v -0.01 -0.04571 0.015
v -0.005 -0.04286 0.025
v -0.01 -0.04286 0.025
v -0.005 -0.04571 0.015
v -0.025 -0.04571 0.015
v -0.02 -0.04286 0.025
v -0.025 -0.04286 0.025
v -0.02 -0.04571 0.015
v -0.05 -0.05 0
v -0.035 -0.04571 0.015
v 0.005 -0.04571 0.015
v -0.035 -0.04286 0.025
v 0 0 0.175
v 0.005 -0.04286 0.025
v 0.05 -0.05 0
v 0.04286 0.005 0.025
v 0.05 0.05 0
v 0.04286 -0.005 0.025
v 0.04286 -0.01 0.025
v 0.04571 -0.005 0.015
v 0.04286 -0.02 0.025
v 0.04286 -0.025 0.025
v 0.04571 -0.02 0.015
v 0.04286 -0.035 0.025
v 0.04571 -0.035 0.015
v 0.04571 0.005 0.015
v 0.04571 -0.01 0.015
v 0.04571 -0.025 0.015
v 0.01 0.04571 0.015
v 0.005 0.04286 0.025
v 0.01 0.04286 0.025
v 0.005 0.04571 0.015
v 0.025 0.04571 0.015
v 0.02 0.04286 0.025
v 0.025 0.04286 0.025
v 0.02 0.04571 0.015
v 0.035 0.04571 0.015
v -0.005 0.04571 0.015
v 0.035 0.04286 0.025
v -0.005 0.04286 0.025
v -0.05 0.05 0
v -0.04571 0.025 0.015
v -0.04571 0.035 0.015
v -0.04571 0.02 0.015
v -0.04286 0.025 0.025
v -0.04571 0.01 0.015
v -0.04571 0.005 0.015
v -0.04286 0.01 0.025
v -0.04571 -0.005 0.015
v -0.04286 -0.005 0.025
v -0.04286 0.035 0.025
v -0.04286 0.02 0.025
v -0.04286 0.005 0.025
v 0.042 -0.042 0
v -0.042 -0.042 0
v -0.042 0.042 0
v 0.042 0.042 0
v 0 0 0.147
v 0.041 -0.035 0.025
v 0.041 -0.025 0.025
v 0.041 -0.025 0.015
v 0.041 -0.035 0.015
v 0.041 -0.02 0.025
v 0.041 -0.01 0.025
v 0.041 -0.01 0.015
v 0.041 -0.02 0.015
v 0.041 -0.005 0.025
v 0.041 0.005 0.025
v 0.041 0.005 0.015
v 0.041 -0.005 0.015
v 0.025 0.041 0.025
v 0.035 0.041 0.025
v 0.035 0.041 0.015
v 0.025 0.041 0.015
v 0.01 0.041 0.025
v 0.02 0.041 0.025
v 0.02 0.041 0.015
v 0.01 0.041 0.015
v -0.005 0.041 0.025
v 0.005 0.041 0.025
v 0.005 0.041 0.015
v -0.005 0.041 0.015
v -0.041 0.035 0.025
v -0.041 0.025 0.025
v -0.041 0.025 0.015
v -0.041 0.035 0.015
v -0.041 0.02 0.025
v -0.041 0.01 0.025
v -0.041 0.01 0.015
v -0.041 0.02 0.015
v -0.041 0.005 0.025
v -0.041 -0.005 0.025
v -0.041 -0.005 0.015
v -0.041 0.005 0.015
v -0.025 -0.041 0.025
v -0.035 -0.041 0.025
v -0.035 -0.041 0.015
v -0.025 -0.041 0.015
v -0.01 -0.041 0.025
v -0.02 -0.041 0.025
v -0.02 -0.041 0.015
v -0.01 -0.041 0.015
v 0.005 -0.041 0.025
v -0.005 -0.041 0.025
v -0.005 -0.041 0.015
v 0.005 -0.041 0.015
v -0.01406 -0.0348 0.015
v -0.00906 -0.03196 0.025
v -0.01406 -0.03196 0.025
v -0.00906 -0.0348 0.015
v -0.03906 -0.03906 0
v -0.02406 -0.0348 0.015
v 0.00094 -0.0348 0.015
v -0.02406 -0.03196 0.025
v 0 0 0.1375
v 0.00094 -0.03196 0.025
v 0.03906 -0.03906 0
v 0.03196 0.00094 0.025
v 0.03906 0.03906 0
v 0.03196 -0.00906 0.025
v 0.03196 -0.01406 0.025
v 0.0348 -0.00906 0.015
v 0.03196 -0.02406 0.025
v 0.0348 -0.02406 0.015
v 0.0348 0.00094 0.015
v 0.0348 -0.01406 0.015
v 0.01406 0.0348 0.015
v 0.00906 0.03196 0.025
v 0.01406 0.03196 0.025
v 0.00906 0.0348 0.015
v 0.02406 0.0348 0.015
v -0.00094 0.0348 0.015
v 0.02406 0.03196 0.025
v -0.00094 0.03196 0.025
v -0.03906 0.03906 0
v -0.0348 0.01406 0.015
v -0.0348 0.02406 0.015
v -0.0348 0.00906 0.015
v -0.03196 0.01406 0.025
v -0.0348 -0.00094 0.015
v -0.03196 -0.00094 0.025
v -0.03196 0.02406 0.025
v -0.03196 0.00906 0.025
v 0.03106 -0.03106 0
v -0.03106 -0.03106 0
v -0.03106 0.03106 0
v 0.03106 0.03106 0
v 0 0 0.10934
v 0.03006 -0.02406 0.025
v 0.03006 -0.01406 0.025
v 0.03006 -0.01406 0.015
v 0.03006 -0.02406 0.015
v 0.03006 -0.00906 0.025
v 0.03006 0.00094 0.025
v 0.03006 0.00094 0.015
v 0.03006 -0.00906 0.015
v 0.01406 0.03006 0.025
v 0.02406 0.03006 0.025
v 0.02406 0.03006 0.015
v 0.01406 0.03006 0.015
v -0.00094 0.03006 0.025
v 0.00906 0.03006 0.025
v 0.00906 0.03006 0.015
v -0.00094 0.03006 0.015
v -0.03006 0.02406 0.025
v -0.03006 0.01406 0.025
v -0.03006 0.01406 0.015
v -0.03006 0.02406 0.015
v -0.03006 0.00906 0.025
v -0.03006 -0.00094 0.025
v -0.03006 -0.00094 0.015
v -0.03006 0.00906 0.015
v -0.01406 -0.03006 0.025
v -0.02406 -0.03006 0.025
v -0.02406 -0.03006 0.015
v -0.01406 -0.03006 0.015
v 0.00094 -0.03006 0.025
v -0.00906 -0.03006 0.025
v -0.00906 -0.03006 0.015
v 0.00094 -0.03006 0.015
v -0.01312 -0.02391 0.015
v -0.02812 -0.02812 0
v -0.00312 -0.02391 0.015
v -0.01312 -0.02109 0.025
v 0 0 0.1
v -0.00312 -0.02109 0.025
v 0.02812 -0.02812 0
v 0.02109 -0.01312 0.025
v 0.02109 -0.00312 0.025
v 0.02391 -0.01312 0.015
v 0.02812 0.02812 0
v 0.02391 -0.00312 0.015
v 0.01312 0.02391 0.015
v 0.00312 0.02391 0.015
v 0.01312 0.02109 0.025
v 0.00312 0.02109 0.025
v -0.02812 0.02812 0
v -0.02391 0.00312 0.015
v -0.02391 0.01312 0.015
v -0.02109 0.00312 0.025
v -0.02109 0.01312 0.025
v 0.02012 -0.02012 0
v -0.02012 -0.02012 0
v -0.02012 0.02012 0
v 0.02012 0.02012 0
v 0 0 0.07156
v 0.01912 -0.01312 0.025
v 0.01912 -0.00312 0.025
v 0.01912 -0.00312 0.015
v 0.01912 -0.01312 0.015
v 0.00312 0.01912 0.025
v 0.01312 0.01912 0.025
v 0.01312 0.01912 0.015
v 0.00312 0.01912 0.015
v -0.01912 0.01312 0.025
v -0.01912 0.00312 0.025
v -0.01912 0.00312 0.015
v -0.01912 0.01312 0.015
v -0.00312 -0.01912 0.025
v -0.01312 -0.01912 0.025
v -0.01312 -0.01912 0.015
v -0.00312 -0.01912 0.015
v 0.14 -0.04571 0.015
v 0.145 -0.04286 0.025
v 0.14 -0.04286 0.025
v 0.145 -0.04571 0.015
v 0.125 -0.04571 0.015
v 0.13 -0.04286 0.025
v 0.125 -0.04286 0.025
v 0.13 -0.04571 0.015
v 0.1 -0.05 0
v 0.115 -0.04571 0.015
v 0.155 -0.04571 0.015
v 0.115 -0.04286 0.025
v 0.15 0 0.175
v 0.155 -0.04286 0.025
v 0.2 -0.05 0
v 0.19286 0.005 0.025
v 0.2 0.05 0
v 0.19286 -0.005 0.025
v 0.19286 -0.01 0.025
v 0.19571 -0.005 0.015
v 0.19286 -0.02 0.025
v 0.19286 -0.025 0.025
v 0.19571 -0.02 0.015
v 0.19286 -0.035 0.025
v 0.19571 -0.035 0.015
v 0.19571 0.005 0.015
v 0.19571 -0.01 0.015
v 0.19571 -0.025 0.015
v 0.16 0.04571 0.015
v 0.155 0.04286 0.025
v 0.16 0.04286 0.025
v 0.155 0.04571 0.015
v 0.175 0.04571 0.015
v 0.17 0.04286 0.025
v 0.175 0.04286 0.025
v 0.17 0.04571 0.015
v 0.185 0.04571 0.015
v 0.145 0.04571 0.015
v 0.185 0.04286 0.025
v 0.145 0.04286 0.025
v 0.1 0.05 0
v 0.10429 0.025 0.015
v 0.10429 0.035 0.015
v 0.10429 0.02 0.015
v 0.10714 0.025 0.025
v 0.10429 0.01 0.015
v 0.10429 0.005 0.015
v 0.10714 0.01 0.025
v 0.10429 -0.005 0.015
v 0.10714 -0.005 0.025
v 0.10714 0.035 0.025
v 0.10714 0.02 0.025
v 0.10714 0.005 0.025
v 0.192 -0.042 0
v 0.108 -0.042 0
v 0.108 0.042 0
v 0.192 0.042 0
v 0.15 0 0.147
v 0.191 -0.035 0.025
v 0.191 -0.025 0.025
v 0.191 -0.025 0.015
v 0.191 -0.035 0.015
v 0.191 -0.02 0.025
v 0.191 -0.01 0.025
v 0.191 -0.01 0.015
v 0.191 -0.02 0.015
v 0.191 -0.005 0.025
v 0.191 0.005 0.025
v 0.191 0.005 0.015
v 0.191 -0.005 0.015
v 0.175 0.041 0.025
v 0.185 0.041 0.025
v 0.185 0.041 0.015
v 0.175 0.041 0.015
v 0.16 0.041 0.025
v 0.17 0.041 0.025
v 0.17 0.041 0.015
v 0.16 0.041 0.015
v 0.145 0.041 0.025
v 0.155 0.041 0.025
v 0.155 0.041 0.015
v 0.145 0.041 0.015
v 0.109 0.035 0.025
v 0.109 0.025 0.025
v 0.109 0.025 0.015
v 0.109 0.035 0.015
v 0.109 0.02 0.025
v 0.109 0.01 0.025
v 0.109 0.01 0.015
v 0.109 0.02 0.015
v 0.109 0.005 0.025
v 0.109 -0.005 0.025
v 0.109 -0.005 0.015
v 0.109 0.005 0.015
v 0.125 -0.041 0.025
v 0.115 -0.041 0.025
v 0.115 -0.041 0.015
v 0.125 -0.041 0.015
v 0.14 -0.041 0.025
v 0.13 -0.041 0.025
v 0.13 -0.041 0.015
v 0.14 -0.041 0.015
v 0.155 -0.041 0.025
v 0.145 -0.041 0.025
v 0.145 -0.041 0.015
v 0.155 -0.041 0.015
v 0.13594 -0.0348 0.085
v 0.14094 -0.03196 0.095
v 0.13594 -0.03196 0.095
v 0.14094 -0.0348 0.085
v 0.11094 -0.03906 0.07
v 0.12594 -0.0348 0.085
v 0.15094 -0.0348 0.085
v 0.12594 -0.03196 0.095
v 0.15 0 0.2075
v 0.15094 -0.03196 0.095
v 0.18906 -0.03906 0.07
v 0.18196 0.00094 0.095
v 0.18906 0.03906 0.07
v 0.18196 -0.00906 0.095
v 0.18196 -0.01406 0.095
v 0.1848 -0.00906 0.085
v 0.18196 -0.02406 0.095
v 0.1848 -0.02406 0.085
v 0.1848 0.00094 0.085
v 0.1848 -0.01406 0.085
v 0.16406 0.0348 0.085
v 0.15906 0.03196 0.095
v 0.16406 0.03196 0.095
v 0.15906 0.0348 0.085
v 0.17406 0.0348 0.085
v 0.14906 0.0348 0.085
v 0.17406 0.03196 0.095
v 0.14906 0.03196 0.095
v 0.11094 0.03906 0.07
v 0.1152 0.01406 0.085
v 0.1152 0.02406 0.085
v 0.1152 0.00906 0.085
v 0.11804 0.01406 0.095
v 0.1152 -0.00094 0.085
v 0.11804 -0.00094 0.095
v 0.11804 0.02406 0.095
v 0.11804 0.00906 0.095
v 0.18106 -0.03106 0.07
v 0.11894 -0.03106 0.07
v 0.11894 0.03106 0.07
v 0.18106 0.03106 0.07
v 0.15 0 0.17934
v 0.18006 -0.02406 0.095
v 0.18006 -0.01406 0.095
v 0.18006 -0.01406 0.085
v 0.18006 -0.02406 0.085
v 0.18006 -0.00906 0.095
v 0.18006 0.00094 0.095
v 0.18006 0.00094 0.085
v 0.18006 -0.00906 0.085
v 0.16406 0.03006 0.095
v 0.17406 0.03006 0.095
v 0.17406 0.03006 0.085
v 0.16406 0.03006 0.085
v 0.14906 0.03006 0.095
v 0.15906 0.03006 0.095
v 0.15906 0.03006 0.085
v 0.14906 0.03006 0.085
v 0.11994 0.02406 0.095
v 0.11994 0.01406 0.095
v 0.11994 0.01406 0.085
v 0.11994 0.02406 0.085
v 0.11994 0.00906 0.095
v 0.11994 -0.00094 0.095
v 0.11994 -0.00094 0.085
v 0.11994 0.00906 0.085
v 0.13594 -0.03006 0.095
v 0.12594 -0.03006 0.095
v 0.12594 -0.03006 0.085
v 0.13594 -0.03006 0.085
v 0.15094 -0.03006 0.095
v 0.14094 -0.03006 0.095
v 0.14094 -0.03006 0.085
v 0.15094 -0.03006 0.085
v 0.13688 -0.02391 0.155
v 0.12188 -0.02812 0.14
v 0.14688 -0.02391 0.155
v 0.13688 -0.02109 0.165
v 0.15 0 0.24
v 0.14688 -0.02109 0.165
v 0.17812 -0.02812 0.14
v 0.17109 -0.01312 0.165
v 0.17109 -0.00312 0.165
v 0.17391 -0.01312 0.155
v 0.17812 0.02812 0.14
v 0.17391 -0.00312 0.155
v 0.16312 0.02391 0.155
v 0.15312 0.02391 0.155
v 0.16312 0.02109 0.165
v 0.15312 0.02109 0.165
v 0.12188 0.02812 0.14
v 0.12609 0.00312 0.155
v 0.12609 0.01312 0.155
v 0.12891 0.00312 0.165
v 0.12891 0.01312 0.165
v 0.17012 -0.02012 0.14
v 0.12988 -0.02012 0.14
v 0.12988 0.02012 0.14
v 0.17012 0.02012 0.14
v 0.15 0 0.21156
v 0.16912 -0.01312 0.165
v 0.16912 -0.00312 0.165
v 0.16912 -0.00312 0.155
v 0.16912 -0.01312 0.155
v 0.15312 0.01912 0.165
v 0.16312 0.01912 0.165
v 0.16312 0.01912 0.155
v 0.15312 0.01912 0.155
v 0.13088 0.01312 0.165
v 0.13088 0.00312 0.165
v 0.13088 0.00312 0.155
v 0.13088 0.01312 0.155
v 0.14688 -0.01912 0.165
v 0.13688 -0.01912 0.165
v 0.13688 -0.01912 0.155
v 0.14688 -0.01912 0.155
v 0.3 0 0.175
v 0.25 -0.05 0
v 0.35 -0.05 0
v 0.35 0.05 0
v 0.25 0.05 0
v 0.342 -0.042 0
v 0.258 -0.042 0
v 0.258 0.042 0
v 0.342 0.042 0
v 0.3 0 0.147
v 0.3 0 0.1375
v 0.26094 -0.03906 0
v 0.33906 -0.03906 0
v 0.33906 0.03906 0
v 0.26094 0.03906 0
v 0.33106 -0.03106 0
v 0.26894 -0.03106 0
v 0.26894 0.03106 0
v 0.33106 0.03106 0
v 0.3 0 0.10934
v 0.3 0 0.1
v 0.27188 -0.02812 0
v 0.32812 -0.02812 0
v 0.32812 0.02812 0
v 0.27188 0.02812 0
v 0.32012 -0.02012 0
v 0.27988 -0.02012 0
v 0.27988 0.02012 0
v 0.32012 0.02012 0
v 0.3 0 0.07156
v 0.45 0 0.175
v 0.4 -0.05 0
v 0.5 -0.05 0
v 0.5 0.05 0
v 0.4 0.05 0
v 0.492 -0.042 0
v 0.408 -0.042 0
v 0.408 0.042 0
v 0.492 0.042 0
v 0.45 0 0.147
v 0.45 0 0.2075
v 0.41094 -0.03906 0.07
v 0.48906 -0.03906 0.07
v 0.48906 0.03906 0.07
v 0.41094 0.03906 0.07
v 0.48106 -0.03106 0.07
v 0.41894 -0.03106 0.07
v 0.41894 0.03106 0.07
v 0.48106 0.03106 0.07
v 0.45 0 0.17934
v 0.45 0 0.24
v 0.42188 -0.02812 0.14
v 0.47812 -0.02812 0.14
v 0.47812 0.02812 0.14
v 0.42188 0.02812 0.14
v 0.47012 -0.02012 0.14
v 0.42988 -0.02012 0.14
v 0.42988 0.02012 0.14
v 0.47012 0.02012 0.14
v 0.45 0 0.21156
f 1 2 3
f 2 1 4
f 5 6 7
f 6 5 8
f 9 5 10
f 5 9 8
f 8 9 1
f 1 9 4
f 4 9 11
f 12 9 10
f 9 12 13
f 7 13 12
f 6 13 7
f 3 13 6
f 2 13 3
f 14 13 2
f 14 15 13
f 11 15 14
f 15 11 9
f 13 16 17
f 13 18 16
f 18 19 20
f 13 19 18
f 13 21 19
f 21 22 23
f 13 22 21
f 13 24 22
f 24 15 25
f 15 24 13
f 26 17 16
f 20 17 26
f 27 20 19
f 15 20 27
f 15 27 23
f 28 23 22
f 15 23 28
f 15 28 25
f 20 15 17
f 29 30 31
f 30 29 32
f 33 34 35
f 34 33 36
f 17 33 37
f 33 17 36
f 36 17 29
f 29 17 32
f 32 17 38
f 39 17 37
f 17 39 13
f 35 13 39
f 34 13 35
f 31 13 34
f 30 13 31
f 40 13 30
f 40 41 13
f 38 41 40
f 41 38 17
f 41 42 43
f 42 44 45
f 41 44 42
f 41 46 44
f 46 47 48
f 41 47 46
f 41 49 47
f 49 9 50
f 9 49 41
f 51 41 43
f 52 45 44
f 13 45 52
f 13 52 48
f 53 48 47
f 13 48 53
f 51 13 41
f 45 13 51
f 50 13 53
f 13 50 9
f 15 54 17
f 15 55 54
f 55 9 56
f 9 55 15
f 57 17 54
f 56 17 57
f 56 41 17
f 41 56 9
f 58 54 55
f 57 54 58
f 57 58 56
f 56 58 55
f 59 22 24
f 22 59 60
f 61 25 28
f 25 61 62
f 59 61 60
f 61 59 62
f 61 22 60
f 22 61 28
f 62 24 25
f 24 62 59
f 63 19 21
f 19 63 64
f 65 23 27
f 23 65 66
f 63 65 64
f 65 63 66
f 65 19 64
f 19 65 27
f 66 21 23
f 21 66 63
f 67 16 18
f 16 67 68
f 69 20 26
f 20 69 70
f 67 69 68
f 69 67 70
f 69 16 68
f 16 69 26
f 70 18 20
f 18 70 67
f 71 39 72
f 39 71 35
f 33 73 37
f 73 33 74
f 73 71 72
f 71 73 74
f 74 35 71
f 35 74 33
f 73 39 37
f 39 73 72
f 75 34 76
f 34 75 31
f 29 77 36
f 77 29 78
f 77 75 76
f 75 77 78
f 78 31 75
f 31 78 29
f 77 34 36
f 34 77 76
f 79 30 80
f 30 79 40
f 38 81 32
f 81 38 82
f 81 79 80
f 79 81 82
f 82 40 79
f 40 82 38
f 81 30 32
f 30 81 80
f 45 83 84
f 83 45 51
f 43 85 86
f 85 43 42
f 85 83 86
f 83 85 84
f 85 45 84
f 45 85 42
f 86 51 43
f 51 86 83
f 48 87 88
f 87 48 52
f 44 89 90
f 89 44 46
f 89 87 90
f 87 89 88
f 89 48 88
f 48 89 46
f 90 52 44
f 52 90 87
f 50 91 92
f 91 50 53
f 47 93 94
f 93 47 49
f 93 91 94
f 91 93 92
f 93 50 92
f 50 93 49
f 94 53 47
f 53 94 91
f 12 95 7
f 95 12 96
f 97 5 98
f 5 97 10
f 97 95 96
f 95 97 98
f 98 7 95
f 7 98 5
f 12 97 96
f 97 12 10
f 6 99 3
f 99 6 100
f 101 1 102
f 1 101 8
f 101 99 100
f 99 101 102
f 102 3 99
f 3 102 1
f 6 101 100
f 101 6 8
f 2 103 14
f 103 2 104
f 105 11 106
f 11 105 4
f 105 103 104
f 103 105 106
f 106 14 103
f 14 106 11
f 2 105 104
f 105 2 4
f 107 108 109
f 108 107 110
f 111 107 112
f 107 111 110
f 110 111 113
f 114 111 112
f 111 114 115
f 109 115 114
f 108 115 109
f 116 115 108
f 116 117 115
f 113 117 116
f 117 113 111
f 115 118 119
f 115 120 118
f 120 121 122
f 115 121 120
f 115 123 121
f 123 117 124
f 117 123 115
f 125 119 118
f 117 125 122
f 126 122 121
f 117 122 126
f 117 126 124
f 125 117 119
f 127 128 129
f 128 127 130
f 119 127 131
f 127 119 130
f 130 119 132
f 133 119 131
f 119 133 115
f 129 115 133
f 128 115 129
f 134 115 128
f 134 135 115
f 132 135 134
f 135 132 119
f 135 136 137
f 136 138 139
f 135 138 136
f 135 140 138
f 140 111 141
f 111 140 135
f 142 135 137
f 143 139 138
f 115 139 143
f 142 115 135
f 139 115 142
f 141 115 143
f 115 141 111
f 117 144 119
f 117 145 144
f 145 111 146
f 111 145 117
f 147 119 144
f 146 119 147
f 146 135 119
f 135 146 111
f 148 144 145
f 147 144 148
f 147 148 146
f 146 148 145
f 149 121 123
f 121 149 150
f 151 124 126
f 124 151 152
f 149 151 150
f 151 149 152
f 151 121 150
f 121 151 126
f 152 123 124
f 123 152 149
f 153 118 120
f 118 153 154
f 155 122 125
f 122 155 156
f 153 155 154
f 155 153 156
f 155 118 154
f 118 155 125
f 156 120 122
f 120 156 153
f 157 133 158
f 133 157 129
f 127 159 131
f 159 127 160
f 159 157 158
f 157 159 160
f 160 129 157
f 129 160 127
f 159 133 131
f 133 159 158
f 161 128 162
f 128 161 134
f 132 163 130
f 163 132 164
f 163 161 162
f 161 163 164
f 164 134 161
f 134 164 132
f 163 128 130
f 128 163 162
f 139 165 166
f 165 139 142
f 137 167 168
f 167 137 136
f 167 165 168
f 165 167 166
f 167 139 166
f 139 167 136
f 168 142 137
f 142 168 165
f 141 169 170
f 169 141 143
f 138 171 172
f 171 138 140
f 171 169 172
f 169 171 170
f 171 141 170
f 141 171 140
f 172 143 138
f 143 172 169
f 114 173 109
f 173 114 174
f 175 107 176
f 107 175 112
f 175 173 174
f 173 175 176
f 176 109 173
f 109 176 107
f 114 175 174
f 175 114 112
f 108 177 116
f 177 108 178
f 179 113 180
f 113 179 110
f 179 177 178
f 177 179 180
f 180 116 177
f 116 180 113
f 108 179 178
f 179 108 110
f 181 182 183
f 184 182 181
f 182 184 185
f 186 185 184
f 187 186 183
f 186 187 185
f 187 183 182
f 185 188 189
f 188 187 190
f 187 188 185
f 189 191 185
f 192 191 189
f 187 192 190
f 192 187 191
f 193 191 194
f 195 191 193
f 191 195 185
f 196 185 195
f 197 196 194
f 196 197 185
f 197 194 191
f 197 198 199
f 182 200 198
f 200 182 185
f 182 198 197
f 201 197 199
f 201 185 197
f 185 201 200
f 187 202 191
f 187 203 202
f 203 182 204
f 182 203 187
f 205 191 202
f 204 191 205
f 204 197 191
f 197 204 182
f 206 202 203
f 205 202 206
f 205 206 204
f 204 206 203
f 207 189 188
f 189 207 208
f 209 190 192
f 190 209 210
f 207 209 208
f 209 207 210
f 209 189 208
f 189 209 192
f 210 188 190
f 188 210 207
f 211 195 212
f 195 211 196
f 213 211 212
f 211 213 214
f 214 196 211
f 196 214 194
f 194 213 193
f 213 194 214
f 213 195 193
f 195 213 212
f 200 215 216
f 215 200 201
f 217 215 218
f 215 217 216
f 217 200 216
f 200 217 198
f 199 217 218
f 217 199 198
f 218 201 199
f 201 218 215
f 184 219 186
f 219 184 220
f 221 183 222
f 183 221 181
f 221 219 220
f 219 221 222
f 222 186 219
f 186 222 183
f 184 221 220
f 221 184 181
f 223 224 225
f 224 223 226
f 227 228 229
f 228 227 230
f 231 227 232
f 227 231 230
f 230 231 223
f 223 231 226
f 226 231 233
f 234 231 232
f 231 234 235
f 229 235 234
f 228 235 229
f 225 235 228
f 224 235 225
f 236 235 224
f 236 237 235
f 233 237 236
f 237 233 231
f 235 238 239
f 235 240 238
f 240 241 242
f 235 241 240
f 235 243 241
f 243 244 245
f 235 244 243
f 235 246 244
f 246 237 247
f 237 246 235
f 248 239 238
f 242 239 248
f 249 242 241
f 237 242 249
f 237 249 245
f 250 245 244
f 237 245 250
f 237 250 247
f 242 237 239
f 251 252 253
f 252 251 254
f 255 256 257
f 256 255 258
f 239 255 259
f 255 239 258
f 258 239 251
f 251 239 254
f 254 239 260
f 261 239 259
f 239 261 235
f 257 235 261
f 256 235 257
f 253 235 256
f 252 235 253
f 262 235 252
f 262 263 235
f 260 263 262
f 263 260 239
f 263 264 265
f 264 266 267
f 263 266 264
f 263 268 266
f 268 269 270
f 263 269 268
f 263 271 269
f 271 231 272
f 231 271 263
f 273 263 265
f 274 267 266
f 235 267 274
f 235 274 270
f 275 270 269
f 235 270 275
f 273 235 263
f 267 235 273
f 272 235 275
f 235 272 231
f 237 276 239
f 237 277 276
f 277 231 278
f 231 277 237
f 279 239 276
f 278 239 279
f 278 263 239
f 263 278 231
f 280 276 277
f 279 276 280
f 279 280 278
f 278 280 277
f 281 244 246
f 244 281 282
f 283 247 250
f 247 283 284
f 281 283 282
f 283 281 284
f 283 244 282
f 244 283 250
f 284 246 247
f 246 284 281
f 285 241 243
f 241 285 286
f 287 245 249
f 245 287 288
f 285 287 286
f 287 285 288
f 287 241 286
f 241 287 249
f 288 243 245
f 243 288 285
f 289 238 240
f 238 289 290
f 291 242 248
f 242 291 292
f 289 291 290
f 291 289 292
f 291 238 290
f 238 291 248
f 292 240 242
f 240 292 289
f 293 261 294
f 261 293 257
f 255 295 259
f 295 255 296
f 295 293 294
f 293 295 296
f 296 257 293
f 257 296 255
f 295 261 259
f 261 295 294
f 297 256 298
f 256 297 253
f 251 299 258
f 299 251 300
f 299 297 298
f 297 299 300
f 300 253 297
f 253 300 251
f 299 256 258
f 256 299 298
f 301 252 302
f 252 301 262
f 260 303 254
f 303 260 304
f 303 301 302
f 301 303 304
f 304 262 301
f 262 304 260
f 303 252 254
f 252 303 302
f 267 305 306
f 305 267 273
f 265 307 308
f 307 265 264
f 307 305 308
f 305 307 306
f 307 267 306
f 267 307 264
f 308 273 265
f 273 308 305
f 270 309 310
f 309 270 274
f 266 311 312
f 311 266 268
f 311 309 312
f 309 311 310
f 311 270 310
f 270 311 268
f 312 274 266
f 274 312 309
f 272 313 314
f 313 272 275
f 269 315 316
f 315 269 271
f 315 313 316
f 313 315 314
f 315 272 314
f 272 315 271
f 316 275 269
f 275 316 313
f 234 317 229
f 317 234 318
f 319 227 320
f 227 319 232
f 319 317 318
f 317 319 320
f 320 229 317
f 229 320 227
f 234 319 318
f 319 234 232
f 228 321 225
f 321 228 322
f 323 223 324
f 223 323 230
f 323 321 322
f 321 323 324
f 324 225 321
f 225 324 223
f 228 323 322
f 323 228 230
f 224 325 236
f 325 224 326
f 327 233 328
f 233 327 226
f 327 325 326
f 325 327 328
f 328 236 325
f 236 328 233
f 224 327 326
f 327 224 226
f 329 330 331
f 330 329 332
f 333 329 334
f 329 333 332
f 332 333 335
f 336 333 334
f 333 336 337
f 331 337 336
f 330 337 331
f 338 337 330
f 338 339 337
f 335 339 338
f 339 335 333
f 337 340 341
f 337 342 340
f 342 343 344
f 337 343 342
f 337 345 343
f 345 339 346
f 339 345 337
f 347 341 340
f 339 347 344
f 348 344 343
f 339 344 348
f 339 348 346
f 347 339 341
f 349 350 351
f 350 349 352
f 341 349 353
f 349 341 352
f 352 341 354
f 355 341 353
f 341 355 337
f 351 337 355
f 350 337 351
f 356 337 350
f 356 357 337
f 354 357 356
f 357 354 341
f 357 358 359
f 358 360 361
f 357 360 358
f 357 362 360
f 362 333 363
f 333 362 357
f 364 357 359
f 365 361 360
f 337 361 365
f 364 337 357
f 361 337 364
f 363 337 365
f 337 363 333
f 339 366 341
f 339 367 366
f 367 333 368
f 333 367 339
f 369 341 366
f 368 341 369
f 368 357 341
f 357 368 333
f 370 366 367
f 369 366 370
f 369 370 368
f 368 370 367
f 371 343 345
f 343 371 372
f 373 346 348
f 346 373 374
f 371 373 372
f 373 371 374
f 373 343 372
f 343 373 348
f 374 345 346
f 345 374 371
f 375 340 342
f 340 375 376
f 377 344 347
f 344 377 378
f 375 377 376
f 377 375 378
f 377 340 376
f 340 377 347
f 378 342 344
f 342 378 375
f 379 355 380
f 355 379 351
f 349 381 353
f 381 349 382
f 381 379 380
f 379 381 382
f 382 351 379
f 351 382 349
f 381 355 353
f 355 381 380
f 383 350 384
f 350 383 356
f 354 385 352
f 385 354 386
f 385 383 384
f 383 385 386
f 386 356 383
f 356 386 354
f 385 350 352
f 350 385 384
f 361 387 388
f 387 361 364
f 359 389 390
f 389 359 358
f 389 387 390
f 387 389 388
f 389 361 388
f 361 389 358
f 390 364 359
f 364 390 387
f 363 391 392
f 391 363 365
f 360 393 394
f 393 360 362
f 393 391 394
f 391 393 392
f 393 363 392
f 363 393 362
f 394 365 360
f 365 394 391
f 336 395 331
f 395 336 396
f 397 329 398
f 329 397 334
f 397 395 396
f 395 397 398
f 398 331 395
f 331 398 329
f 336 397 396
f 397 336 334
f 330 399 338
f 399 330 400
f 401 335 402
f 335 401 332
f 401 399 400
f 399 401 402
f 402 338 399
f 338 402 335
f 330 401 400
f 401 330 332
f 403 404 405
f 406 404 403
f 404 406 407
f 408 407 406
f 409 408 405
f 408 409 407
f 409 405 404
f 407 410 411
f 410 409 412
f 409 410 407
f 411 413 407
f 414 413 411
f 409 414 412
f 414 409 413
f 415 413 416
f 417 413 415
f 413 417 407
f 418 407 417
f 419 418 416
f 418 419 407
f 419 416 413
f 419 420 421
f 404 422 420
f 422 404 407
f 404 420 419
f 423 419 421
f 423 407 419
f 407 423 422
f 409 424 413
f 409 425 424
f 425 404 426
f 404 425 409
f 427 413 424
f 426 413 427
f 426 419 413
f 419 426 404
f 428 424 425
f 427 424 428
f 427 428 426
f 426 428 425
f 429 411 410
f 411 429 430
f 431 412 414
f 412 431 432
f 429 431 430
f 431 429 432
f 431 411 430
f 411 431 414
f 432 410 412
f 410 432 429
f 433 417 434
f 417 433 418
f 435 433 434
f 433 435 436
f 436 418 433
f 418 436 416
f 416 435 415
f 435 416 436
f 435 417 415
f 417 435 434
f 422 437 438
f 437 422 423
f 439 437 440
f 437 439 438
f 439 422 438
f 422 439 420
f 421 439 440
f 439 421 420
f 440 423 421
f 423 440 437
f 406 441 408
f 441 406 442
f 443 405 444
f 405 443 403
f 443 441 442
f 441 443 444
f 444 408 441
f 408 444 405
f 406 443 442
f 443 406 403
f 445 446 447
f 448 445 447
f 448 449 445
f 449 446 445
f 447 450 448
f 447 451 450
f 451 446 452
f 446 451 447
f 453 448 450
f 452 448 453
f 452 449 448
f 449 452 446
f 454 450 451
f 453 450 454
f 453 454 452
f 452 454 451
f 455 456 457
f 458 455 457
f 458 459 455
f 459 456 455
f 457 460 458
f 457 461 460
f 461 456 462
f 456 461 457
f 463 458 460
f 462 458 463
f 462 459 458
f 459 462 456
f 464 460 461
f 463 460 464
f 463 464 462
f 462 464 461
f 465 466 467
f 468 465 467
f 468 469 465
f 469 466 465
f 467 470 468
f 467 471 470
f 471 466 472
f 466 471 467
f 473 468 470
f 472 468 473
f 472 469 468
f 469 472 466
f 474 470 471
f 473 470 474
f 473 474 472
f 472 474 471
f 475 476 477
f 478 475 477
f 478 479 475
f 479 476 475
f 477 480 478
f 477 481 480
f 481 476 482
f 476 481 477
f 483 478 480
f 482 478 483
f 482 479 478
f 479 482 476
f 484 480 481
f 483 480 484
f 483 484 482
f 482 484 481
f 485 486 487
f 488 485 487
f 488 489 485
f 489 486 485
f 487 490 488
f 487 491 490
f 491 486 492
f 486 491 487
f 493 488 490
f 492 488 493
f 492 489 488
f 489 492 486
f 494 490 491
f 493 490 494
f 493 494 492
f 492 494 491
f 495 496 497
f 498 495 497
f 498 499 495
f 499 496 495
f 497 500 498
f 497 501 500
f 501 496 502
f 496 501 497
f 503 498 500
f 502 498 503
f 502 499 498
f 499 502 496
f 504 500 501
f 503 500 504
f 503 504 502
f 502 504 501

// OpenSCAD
// Icehouse pieces
// https://en.wikipedia.org/wiki/Icehouse_pieces
//
// Dimensions:
// Large: Base 1, Height 7/4
// Medium: Base 25/32, Height 11/8
// Small: Base 9/16, Height 1
//
// Pyramids have a hollow center with a wall thickness of 0.08. They have small
// indentations on each face called pips to represent the size of the pyramid;
// large pyramids have three pips, medium pyramids have two pips, and small
// pyramids have one pip.

// What model to render
Model = "Demo"; // [Demo, L, M, S, L_C, M_C, S_C]

module pyramid(width, height) {
    x = -width / 2;
    y = -width / 2;
    polyhedron(
        [[x, y, 0], [x + width, y, 0], [x + width, y + width, 0],
         [x, y + width, 0], [x + width / 2, y + width / 2, height]],
        [ [ 0, 1, 4 ], [ 1, 2, 4 ], [ 2, 3, 4 ], [ 3, 0, 4 ], [ 3, 2, 1, 0 ] ]);
}

thickness = 0.008;

module hollow_pyramid(width, height) {
    width = width / 10;
    height = height / 10;
    difference() {
        pyramid(width, height);
        pyramid(width - thickness * 2,
                height / width * 2 * (width / 2 - thickness));
    }
}

module repeat_4() {
    children();
    rotate([ 0, 0, 90 ]) children();
    rotate([ 0, 0, 180 ]) children();
    rotate([ 0, 0, 270 ]) children();
}

module large_pyramid() {
    difference() {
        hollow_pyramid(1, 1 + 3 / 4);
        // Three pips
        repeat_4() {
            translate([ 1 / 2 / 10 - 0.004, -1 / 2 / 10 + 0.02, 0.02 ])
                cube(0.01, center = true);
            translate([ 1 / 2 / 10 - 0.004, -1 / 2 / 10 + 0.035, 0.02 ])
                cube(0.01, center = true);
            translate([ 1 / 2 / 10 - 0.004, -1 / 2 / 10 + 0.05, 0.02 ])
                cube(0.01, center = true);
        }
    }
}

module medium_pyramid() {
    difference() {
        hollow_pyramid(25 / 32, 1 + 3 / 8);
        // Two pips
        repeat_4() {
            translate([ 25 / 64 / 10 - 0.004, -25 / 64 / 10 + 0.02, 0.02 ])
                cube(0.01, center = true);
            translate([ 25 / 64 / 10 - 0.004, -25 / 64 / 10 + 0.035, 0.02 ])
                cube(0.01, center = true);
        }
    }
}

module small_pyramid() {
    difference() {
        hollow_pyramid(9 / 16, 1);
        // One pip
        repeat_4() {
            translate([ 9 / 32 / 10 - 0.004, -9 / 32 / 10 + 0.02, 0.02 ])
                cube(0.01, center = true);
        }
    }
}

if (Model == "Demo") {
    // Visual models (includes pips)

    // Nest
    large_pyramid();
    medium_pyramid();
    small_pyramid();

    // Tree
    translate([ 0.15, 0, 0 ]) {
        large_pyramid();
        translate([ 0, 0, 0.07 ]) medium_pyramid();
        translate([ 0, 0, 0.14 ]) small_pyramid();
    }

    // Simplified models for collision detection (no pips)

    // Nest
    translate([ 0.3, 0, 0 ]) {
        hollow_pyramid(1, 1 + 3 / 4);
        hollow_pyramid(25 / 32, 1 + 3 / 8);
        hollow_pyramid(9 / 16, 1);
    }

    // Tree
    translate([ 0.45, 0, 0 ]) {
        hollow_pyramid(1, 1 + 3 / 4);
        translate([ 0, 0, 0.07 ]) hollow_pyramid(25 / 32, 1 + 3 / 8);
        translate([ 0, 0, 0.14 ]) hollow_pyramid(9 / 16, 1);
    }
}

// Resonite imports meshes rotated by 90 degrees
rotate([ -90, 0, 0 ]) {
    if (Model == "L") {
        large_pyramid();
    } else if (Model == "M") {
        medium_pyramid();
    } else if (Model == "S") {
        small_pyramid();
    } else if (Model == "L_C") {
        hollow_pyramid(1, 1 + 3 / 4);
    } else if (Model == "M_C") {
        hollow_pyramid(25 / 32, 1 + 3 / 8);
    } else if (Model == "S_C") {
        hollow_pyramid(9 / 16, 1);
    }
}
